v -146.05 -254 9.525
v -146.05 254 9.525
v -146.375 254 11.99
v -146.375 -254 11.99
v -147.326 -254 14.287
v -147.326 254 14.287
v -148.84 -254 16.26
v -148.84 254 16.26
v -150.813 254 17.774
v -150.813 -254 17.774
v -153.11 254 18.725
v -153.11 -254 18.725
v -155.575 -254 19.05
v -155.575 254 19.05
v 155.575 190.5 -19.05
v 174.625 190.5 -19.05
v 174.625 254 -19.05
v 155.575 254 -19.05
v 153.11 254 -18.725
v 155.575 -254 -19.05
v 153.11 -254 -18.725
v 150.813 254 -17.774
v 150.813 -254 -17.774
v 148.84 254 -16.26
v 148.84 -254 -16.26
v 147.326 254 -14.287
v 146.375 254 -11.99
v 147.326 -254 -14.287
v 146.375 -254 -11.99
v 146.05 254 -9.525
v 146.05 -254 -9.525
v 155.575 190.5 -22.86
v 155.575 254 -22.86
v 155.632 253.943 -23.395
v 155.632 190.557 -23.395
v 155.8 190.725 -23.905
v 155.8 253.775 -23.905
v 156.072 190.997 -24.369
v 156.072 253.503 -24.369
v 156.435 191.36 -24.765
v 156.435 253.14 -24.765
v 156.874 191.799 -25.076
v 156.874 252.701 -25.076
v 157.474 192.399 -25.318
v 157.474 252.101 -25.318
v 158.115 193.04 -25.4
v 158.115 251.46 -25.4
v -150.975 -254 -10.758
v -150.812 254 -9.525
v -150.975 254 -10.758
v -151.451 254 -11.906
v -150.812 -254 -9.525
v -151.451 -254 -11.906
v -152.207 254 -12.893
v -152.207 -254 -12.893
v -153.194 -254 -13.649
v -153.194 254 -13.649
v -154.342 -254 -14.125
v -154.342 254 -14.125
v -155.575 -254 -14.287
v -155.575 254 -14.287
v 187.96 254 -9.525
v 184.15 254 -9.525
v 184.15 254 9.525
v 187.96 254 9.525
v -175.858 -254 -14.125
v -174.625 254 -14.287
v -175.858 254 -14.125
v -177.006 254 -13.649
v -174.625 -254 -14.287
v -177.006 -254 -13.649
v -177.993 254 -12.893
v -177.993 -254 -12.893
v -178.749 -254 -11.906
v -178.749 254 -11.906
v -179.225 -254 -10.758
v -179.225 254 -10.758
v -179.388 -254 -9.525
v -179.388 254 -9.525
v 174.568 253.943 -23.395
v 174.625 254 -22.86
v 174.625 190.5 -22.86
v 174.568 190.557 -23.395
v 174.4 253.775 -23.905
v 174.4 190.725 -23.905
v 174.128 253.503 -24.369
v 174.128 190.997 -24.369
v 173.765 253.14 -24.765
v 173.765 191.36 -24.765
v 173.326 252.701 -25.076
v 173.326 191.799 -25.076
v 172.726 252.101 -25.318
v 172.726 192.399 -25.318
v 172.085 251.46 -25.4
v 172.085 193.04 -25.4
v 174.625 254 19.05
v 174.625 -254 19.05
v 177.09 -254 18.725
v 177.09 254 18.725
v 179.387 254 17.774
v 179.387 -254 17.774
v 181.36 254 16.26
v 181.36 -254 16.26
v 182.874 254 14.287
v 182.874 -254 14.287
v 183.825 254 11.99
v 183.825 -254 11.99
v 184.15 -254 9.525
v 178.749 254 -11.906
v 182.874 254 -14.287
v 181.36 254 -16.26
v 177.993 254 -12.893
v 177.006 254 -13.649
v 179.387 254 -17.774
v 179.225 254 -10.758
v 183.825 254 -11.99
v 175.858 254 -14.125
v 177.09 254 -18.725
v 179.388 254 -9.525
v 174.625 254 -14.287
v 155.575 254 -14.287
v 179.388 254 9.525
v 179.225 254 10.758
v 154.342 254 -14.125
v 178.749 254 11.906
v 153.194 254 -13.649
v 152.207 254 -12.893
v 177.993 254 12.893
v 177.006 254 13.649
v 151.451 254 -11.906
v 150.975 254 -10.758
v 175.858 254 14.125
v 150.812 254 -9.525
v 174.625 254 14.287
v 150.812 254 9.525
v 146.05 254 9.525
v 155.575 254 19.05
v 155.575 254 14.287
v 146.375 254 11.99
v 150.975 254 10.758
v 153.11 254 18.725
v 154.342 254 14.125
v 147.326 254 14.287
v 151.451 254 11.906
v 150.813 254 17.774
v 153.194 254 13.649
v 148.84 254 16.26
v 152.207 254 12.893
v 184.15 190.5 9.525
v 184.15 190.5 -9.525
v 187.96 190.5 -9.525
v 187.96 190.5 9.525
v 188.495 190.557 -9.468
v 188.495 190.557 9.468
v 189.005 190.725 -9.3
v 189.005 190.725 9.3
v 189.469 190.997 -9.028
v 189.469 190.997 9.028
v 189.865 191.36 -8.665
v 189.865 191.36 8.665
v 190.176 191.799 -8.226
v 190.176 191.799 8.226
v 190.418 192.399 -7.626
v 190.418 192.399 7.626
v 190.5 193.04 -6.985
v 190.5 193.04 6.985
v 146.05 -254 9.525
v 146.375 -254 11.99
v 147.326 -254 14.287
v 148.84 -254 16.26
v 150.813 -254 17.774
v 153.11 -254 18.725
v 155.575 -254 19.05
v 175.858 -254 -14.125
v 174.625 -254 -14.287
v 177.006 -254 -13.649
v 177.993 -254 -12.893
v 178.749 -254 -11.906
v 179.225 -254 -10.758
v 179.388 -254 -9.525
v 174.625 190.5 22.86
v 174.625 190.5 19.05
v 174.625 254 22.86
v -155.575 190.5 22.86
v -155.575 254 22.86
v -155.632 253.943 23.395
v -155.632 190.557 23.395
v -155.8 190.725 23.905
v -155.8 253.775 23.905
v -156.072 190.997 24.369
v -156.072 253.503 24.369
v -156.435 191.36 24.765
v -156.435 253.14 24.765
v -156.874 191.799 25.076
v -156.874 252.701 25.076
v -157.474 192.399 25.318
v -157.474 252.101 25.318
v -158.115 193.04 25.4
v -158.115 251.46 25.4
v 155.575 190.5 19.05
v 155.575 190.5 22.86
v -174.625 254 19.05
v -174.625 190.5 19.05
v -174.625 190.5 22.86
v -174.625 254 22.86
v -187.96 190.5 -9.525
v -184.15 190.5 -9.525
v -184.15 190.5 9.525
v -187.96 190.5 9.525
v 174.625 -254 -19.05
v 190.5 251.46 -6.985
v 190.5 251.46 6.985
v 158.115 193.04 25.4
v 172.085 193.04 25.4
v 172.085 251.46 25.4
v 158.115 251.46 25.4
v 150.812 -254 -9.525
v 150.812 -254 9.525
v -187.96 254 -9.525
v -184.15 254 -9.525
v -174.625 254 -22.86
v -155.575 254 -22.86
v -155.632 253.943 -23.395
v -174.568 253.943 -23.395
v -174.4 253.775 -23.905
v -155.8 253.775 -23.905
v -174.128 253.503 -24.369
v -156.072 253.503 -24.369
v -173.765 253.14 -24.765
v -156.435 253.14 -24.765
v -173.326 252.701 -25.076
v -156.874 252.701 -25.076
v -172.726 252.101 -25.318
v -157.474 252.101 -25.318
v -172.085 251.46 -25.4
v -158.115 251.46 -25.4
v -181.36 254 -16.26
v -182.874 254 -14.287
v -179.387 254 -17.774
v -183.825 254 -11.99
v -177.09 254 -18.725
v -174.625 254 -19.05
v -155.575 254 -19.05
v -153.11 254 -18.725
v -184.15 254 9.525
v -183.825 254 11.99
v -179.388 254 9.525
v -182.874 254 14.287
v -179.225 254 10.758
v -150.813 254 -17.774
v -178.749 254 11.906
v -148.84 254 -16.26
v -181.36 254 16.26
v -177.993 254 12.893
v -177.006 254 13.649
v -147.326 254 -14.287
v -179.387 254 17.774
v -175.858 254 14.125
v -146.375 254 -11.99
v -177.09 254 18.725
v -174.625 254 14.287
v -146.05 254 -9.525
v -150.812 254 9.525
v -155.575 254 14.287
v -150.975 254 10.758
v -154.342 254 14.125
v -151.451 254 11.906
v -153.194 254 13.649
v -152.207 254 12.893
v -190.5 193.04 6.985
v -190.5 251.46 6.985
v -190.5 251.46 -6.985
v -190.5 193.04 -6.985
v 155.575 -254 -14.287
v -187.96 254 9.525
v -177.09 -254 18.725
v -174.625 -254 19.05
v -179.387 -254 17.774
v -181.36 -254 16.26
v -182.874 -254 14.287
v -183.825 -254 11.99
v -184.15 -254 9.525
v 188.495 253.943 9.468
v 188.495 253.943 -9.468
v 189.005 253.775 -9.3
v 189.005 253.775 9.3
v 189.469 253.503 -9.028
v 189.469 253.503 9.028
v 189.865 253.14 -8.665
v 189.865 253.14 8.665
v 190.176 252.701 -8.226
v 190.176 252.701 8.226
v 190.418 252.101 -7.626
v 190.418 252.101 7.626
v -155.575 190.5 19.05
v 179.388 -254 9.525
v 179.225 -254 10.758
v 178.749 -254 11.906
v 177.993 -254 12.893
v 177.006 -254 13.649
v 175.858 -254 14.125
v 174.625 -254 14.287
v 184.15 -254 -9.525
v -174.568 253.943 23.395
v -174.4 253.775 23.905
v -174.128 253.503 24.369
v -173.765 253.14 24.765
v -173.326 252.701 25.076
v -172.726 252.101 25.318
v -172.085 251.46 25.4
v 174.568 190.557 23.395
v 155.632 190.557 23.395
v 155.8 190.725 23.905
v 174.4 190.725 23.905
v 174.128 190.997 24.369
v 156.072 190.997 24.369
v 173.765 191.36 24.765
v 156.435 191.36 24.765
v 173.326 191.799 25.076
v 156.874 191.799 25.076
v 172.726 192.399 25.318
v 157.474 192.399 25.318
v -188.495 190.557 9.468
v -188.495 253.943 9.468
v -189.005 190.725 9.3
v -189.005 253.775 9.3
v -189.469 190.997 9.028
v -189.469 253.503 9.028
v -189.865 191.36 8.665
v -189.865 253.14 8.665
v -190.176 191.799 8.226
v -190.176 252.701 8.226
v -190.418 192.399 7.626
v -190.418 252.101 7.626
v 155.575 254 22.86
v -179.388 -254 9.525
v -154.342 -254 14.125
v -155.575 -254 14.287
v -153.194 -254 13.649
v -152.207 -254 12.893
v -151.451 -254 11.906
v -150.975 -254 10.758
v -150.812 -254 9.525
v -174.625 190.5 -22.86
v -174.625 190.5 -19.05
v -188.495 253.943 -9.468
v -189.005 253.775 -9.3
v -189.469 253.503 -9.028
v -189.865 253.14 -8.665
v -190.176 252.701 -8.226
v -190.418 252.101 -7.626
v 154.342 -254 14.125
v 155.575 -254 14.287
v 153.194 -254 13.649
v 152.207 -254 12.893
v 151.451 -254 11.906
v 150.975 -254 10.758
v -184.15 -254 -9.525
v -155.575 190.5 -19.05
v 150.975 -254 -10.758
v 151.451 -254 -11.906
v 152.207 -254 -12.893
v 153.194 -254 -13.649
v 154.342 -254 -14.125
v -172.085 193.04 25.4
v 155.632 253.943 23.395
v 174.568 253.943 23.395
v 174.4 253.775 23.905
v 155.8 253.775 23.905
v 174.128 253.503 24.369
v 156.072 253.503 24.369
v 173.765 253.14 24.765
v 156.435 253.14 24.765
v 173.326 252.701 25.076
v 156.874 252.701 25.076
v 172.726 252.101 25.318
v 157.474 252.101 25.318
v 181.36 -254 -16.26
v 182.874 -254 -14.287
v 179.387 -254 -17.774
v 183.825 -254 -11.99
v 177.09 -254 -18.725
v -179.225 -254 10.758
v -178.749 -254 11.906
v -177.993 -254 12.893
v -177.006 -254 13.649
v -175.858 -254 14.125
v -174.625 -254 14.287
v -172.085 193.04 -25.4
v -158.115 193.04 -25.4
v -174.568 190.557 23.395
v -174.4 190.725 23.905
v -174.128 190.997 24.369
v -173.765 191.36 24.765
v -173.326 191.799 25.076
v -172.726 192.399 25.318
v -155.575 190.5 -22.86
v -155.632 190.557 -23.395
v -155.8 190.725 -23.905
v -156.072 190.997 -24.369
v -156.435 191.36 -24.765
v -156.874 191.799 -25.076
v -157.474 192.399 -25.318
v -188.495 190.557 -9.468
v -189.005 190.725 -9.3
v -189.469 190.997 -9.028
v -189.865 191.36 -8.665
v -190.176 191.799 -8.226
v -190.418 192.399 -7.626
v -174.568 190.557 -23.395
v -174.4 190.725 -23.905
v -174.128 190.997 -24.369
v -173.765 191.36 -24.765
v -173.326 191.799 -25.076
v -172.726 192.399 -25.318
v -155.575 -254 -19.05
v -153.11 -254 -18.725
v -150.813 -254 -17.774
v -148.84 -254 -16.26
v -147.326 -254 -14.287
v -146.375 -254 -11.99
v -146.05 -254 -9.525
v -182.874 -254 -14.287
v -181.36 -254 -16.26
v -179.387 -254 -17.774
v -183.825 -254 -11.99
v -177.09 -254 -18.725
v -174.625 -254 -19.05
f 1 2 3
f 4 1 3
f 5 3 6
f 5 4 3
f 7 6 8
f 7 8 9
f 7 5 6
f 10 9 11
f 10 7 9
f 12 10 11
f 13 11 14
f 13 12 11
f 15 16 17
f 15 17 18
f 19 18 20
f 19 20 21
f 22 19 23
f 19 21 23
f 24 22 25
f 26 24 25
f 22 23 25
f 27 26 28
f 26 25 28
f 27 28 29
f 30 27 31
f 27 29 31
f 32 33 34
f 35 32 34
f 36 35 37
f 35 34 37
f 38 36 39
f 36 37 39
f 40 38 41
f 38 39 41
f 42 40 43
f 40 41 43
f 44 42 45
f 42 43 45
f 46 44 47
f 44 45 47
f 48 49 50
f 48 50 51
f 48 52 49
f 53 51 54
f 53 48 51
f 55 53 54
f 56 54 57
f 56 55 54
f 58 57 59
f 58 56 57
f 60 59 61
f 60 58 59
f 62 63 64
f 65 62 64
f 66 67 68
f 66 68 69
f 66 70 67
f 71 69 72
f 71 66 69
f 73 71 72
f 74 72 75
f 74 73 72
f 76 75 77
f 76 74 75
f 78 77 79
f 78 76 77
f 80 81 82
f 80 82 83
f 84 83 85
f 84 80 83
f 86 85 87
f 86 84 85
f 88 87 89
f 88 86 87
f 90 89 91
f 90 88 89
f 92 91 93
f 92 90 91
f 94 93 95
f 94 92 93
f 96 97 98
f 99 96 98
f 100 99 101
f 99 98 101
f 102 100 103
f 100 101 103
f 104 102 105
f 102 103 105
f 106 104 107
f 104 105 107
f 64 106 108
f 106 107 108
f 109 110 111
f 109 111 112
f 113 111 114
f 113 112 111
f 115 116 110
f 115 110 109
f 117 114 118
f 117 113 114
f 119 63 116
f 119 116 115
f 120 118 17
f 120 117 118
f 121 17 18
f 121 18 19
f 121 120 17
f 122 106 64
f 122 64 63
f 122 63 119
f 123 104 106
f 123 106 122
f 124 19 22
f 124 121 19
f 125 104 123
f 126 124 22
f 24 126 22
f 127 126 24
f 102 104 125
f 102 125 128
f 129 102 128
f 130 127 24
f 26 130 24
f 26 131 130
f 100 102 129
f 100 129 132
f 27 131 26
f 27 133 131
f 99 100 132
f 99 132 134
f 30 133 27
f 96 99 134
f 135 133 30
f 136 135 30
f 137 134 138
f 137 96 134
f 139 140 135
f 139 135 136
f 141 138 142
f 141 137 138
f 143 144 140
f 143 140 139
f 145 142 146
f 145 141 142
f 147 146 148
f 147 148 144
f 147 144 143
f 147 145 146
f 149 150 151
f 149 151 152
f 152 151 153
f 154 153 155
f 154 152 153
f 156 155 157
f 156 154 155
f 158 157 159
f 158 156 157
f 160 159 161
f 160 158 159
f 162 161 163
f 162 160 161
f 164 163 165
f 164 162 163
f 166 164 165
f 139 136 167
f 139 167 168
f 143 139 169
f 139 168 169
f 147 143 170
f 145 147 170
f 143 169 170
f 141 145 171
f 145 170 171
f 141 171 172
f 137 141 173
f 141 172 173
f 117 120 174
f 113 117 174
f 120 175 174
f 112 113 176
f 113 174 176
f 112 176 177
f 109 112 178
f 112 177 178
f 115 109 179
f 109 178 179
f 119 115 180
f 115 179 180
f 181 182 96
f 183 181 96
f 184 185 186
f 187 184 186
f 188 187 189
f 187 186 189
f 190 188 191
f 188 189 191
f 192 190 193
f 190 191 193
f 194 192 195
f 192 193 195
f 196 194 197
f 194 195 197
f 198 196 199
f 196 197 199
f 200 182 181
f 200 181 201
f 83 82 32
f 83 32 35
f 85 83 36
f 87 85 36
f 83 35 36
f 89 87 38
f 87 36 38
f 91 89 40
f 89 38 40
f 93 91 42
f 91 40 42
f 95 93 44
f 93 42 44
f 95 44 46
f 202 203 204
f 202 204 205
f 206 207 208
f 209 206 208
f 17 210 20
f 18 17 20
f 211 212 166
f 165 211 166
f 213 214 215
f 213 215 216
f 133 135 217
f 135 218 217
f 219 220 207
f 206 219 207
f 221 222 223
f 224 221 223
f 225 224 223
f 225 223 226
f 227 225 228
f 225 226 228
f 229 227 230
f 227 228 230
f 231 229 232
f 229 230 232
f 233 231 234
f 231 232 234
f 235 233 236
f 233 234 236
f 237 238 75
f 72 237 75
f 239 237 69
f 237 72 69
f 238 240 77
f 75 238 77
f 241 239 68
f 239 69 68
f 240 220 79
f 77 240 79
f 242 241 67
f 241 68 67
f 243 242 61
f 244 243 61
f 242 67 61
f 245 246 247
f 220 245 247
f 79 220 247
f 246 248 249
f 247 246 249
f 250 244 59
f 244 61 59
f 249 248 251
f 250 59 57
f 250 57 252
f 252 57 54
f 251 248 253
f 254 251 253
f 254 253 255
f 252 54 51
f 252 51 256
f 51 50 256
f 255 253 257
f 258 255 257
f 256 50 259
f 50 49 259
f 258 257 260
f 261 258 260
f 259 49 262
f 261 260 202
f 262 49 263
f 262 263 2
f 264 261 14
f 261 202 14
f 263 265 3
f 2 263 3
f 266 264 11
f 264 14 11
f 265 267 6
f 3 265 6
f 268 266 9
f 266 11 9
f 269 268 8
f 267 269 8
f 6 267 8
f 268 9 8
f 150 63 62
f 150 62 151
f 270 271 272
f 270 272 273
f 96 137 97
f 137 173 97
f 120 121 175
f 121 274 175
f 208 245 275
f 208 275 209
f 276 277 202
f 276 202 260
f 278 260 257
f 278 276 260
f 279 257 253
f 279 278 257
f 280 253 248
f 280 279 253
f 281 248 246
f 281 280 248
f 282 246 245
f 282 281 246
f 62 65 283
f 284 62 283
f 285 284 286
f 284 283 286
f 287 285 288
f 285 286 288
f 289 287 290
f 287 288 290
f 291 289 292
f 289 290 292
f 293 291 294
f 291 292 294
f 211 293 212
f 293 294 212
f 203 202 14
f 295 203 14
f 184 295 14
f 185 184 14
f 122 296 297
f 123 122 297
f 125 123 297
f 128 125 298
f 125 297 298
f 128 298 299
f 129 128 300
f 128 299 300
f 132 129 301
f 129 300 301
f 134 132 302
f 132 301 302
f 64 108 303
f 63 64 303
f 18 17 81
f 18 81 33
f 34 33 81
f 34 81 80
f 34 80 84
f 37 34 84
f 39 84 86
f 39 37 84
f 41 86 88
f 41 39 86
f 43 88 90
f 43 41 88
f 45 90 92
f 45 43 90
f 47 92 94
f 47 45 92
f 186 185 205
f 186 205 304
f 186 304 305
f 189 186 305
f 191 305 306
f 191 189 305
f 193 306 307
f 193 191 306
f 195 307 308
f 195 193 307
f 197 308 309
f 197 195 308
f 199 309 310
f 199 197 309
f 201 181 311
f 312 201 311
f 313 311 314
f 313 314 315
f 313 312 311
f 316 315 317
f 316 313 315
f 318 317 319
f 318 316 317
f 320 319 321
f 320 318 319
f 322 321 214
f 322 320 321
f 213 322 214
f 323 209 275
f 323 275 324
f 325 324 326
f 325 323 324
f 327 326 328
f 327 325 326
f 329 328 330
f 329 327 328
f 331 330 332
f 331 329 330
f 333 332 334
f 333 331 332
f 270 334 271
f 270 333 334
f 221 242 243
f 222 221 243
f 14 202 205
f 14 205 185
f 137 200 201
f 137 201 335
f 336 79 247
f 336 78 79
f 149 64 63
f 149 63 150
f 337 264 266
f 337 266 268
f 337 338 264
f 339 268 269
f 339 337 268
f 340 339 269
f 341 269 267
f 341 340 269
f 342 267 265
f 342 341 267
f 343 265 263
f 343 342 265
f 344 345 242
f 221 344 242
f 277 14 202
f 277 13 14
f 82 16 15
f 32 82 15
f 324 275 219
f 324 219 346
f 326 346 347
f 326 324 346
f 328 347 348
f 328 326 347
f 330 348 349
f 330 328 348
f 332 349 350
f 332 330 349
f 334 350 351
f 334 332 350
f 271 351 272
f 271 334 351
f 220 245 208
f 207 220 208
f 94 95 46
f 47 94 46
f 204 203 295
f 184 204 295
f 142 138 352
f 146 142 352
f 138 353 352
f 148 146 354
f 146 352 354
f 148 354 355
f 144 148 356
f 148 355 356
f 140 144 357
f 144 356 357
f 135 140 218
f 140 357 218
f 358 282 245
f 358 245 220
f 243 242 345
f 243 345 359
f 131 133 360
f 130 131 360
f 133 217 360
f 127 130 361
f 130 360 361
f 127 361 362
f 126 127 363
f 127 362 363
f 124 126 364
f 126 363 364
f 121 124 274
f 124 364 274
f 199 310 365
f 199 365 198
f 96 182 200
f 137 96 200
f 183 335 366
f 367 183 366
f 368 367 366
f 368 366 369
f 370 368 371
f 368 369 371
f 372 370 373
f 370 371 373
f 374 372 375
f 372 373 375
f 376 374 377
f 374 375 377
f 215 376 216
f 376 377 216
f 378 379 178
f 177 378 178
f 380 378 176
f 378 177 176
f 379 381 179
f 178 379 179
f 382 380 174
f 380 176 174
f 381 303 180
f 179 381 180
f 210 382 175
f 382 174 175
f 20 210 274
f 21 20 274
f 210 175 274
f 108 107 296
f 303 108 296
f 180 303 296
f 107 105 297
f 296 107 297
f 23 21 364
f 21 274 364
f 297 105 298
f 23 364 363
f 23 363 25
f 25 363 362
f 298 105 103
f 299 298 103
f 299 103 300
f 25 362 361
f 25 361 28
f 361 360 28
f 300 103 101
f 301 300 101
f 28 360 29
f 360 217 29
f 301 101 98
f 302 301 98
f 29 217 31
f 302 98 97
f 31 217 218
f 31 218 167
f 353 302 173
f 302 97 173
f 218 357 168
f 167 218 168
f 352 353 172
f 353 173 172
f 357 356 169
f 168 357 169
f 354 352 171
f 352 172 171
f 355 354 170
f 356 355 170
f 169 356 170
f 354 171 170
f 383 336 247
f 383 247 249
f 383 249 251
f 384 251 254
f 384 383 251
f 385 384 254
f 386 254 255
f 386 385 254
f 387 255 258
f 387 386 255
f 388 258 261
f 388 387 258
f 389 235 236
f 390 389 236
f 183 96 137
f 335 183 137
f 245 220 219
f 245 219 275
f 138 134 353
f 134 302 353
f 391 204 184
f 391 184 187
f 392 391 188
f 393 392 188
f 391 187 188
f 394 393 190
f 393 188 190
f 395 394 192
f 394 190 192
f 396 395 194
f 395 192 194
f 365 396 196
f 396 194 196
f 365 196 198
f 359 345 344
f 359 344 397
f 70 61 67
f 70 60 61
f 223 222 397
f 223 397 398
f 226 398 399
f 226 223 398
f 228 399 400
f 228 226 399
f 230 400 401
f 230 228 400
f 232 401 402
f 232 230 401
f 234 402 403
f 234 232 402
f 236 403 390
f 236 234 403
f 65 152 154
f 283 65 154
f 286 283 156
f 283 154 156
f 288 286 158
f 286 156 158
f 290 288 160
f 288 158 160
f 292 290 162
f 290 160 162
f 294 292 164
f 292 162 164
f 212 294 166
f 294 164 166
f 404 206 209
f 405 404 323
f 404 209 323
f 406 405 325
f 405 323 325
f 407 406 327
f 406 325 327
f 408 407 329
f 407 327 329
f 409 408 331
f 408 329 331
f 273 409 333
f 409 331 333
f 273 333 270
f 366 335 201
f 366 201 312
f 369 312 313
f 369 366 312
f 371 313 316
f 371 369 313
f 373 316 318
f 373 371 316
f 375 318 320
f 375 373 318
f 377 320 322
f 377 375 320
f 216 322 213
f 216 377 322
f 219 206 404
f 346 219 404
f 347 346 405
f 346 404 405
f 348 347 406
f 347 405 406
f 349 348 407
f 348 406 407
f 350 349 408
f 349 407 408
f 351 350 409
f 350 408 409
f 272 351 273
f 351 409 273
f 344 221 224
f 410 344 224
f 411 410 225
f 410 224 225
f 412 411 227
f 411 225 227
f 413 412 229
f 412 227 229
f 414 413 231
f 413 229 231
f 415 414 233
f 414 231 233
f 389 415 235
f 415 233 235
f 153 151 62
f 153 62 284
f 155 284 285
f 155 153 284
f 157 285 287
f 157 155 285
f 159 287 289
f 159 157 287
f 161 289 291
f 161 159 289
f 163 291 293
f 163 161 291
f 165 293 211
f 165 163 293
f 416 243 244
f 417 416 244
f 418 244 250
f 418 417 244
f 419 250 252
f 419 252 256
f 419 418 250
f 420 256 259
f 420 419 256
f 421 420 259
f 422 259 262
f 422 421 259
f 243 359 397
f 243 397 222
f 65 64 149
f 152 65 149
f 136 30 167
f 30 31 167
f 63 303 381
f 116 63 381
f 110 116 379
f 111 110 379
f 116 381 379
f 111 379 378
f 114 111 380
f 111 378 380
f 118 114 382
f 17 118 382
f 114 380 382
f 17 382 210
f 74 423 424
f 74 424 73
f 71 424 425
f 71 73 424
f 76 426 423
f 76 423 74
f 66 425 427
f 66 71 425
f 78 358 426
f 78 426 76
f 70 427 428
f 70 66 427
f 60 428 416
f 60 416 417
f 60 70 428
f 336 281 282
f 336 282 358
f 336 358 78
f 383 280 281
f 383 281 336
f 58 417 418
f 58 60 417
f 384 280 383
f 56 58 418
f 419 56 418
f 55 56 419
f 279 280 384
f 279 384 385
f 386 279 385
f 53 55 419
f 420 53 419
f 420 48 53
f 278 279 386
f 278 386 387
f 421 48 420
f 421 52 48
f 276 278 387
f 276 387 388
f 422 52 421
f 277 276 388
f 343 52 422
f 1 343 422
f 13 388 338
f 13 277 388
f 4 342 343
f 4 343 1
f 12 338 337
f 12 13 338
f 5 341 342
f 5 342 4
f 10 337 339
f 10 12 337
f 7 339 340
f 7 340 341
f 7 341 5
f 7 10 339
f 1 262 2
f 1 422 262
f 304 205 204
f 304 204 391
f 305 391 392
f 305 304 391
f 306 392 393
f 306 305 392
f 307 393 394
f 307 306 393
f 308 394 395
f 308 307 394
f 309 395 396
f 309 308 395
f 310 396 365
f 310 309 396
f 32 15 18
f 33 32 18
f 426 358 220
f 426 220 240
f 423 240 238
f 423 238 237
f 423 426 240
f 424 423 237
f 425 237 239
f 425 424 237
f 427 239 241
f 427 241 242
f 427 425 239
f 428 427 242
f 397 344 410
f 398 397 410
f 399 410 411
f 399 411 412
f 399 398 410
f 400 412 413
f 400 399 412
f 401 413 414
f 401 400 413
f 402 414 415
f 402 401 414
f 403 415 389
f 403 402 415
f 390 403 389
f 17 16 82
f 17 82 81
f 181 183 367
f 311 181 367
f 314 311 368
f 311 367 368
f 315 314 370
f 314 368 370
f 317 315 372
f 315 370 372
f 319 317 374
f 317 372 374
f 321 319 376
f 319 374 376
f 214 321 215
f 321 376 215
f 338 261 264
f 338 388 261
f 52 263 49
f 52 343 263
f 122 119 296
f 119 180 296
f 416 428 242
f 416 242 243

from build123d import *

# Parameters (mm, degrees)
F1_DEPTH = 254
F2_W     = 19.05
F2_H     = 63.5
F3_DEPTH = 6.35
F4_R     = 2.54
F5_W     = 63.5
F5_H     = 19.05
F6_DEPTH = 6.35
F7_R     = 2.54


with BuildPart() as f1:
    # F0 (on Front) → F1 (new body, symmetric)
    with BuildSketch(Plane.XZ):
        with BuildLine():
            Line((-155.575, 19.05), (-174.625, 19.05))
            ThreePointArc((-174.625, 19.05), (-181.360192, 16.260192), (-184.15, 9.525))
            Line((-184.15, 9.525), (-184.15, -9.525))
            ThreePointArc((-184.15, -9.525), (-181.360192, -16.260192), (-174.625, -19.05))
            Line((-174.625, -19.05), (-155.575, -19.05))
            ThreePointArc((-155.575, -19.05), (-148.839808, -16.260192), (-146.05, -9.525))
            Line((-146.05, -9.525), (-146.05, 9.525))
            ThreePointArc((-146.05, 9.525), (-148.839808, 16.260192), (-155.575, 19.05))
        make_face()
        with BuildLine():
            ThreePointArc((-179.3875, 9.525), (-177.992596, 12.892596), (-174.625, 14.2875))
            Line((-174.625, 14.2875), (-155.575, 14.2875))
            ThreePointArc((-155.575, 14.2875), (-152.207404, 12.892596), (-150.8125, 9.525))
            Line((-150.8125, 9.525), (-150.8125, -9.525))
            ThreePointArc((-150.8125, -9.525), (-152.207404, -12.892596), (-155.575, -14.2875))
            Line((-155.575, -14.2875), (-174.625, -14.2875))
            ThreePointArc((-174.625, -14.2875), (-177.992596, -12.892596), (-179.3875, -9.525))
            Line((-179.3875, -9.525), (-179.3875, 9.525))
        make_face(mode=Mode.SUBTRACT)
    extrude(amount=F1_DEPTH, both=True)


with BuildPart() as f3:
    # F2 (on face) → F3 (new body)
    with BuildSketch(Plane.XY.offset(19.05)):
        with Locations((-165.1, 222.25)):
            Rectangle(F2_W, F2_H)
    extrude(amount=F3_DEPTH)

    # F4
    f4_edges = [f3.edges().sort_by_distance(p)[0] for p in [
        (-165.1, 254, 25.4),
        (-174.625, 222.25, 25.4),
        (-165.1, 190.5, 25.4),
        (-155.575, 222.25, 25.4),
    ]]
    fillet(f4_edges, radius=F4_R)


with BuildPart() as f6:
    # F5 (on face) → F6 (new body)
    with BuildSketch(Plane(origin=(-184.15, 0, 0), x_dir=(0, -1, 0), z_dir=(-1, 0, 0))):
        with Locations((-222.25, 0)):
            Rectangle(F5_W, F5_H)
    extrude(amount=F6_DEPTH)

    # F7
    f7_edges = [f6.edges().sort_by_distance(p)[0] for p in [
        (-190.5, 222.25, 9.525),
        (-190.5, 254, 0),
        (-190.5, 222.25, -9.525),
        (-190.5, 190.5, 0),
    ]]
    fillet(f7_edges, radius=F7_R)


with BuildPart() as f8_1:
    # F8: instance of F3
    add(f3.part.mirror(Plane.XY))


with BuildPart() as f9_1:
    # F9: instance of F1
    add(f1.part.mirror(Plane.YZ))


with BuildPart() as f9_2:
    # F9: instance of F3
    add(f3.part.mirror(Plane.YZ))


with BuildPart() as f9_3:
    # F9: instance of F6
    add(f6.part.mirror(Plane.YZ))


with BuildPart() as f9_4:
    # F9: instance of F8_1
    add(f8_1.part.mirror(Plane.YZ))


solid = Compound([f1.part, f3.part, f6.part, f8_1.part, f9_1.part, f9_2.part, f9_3.part, f9_4.part])
